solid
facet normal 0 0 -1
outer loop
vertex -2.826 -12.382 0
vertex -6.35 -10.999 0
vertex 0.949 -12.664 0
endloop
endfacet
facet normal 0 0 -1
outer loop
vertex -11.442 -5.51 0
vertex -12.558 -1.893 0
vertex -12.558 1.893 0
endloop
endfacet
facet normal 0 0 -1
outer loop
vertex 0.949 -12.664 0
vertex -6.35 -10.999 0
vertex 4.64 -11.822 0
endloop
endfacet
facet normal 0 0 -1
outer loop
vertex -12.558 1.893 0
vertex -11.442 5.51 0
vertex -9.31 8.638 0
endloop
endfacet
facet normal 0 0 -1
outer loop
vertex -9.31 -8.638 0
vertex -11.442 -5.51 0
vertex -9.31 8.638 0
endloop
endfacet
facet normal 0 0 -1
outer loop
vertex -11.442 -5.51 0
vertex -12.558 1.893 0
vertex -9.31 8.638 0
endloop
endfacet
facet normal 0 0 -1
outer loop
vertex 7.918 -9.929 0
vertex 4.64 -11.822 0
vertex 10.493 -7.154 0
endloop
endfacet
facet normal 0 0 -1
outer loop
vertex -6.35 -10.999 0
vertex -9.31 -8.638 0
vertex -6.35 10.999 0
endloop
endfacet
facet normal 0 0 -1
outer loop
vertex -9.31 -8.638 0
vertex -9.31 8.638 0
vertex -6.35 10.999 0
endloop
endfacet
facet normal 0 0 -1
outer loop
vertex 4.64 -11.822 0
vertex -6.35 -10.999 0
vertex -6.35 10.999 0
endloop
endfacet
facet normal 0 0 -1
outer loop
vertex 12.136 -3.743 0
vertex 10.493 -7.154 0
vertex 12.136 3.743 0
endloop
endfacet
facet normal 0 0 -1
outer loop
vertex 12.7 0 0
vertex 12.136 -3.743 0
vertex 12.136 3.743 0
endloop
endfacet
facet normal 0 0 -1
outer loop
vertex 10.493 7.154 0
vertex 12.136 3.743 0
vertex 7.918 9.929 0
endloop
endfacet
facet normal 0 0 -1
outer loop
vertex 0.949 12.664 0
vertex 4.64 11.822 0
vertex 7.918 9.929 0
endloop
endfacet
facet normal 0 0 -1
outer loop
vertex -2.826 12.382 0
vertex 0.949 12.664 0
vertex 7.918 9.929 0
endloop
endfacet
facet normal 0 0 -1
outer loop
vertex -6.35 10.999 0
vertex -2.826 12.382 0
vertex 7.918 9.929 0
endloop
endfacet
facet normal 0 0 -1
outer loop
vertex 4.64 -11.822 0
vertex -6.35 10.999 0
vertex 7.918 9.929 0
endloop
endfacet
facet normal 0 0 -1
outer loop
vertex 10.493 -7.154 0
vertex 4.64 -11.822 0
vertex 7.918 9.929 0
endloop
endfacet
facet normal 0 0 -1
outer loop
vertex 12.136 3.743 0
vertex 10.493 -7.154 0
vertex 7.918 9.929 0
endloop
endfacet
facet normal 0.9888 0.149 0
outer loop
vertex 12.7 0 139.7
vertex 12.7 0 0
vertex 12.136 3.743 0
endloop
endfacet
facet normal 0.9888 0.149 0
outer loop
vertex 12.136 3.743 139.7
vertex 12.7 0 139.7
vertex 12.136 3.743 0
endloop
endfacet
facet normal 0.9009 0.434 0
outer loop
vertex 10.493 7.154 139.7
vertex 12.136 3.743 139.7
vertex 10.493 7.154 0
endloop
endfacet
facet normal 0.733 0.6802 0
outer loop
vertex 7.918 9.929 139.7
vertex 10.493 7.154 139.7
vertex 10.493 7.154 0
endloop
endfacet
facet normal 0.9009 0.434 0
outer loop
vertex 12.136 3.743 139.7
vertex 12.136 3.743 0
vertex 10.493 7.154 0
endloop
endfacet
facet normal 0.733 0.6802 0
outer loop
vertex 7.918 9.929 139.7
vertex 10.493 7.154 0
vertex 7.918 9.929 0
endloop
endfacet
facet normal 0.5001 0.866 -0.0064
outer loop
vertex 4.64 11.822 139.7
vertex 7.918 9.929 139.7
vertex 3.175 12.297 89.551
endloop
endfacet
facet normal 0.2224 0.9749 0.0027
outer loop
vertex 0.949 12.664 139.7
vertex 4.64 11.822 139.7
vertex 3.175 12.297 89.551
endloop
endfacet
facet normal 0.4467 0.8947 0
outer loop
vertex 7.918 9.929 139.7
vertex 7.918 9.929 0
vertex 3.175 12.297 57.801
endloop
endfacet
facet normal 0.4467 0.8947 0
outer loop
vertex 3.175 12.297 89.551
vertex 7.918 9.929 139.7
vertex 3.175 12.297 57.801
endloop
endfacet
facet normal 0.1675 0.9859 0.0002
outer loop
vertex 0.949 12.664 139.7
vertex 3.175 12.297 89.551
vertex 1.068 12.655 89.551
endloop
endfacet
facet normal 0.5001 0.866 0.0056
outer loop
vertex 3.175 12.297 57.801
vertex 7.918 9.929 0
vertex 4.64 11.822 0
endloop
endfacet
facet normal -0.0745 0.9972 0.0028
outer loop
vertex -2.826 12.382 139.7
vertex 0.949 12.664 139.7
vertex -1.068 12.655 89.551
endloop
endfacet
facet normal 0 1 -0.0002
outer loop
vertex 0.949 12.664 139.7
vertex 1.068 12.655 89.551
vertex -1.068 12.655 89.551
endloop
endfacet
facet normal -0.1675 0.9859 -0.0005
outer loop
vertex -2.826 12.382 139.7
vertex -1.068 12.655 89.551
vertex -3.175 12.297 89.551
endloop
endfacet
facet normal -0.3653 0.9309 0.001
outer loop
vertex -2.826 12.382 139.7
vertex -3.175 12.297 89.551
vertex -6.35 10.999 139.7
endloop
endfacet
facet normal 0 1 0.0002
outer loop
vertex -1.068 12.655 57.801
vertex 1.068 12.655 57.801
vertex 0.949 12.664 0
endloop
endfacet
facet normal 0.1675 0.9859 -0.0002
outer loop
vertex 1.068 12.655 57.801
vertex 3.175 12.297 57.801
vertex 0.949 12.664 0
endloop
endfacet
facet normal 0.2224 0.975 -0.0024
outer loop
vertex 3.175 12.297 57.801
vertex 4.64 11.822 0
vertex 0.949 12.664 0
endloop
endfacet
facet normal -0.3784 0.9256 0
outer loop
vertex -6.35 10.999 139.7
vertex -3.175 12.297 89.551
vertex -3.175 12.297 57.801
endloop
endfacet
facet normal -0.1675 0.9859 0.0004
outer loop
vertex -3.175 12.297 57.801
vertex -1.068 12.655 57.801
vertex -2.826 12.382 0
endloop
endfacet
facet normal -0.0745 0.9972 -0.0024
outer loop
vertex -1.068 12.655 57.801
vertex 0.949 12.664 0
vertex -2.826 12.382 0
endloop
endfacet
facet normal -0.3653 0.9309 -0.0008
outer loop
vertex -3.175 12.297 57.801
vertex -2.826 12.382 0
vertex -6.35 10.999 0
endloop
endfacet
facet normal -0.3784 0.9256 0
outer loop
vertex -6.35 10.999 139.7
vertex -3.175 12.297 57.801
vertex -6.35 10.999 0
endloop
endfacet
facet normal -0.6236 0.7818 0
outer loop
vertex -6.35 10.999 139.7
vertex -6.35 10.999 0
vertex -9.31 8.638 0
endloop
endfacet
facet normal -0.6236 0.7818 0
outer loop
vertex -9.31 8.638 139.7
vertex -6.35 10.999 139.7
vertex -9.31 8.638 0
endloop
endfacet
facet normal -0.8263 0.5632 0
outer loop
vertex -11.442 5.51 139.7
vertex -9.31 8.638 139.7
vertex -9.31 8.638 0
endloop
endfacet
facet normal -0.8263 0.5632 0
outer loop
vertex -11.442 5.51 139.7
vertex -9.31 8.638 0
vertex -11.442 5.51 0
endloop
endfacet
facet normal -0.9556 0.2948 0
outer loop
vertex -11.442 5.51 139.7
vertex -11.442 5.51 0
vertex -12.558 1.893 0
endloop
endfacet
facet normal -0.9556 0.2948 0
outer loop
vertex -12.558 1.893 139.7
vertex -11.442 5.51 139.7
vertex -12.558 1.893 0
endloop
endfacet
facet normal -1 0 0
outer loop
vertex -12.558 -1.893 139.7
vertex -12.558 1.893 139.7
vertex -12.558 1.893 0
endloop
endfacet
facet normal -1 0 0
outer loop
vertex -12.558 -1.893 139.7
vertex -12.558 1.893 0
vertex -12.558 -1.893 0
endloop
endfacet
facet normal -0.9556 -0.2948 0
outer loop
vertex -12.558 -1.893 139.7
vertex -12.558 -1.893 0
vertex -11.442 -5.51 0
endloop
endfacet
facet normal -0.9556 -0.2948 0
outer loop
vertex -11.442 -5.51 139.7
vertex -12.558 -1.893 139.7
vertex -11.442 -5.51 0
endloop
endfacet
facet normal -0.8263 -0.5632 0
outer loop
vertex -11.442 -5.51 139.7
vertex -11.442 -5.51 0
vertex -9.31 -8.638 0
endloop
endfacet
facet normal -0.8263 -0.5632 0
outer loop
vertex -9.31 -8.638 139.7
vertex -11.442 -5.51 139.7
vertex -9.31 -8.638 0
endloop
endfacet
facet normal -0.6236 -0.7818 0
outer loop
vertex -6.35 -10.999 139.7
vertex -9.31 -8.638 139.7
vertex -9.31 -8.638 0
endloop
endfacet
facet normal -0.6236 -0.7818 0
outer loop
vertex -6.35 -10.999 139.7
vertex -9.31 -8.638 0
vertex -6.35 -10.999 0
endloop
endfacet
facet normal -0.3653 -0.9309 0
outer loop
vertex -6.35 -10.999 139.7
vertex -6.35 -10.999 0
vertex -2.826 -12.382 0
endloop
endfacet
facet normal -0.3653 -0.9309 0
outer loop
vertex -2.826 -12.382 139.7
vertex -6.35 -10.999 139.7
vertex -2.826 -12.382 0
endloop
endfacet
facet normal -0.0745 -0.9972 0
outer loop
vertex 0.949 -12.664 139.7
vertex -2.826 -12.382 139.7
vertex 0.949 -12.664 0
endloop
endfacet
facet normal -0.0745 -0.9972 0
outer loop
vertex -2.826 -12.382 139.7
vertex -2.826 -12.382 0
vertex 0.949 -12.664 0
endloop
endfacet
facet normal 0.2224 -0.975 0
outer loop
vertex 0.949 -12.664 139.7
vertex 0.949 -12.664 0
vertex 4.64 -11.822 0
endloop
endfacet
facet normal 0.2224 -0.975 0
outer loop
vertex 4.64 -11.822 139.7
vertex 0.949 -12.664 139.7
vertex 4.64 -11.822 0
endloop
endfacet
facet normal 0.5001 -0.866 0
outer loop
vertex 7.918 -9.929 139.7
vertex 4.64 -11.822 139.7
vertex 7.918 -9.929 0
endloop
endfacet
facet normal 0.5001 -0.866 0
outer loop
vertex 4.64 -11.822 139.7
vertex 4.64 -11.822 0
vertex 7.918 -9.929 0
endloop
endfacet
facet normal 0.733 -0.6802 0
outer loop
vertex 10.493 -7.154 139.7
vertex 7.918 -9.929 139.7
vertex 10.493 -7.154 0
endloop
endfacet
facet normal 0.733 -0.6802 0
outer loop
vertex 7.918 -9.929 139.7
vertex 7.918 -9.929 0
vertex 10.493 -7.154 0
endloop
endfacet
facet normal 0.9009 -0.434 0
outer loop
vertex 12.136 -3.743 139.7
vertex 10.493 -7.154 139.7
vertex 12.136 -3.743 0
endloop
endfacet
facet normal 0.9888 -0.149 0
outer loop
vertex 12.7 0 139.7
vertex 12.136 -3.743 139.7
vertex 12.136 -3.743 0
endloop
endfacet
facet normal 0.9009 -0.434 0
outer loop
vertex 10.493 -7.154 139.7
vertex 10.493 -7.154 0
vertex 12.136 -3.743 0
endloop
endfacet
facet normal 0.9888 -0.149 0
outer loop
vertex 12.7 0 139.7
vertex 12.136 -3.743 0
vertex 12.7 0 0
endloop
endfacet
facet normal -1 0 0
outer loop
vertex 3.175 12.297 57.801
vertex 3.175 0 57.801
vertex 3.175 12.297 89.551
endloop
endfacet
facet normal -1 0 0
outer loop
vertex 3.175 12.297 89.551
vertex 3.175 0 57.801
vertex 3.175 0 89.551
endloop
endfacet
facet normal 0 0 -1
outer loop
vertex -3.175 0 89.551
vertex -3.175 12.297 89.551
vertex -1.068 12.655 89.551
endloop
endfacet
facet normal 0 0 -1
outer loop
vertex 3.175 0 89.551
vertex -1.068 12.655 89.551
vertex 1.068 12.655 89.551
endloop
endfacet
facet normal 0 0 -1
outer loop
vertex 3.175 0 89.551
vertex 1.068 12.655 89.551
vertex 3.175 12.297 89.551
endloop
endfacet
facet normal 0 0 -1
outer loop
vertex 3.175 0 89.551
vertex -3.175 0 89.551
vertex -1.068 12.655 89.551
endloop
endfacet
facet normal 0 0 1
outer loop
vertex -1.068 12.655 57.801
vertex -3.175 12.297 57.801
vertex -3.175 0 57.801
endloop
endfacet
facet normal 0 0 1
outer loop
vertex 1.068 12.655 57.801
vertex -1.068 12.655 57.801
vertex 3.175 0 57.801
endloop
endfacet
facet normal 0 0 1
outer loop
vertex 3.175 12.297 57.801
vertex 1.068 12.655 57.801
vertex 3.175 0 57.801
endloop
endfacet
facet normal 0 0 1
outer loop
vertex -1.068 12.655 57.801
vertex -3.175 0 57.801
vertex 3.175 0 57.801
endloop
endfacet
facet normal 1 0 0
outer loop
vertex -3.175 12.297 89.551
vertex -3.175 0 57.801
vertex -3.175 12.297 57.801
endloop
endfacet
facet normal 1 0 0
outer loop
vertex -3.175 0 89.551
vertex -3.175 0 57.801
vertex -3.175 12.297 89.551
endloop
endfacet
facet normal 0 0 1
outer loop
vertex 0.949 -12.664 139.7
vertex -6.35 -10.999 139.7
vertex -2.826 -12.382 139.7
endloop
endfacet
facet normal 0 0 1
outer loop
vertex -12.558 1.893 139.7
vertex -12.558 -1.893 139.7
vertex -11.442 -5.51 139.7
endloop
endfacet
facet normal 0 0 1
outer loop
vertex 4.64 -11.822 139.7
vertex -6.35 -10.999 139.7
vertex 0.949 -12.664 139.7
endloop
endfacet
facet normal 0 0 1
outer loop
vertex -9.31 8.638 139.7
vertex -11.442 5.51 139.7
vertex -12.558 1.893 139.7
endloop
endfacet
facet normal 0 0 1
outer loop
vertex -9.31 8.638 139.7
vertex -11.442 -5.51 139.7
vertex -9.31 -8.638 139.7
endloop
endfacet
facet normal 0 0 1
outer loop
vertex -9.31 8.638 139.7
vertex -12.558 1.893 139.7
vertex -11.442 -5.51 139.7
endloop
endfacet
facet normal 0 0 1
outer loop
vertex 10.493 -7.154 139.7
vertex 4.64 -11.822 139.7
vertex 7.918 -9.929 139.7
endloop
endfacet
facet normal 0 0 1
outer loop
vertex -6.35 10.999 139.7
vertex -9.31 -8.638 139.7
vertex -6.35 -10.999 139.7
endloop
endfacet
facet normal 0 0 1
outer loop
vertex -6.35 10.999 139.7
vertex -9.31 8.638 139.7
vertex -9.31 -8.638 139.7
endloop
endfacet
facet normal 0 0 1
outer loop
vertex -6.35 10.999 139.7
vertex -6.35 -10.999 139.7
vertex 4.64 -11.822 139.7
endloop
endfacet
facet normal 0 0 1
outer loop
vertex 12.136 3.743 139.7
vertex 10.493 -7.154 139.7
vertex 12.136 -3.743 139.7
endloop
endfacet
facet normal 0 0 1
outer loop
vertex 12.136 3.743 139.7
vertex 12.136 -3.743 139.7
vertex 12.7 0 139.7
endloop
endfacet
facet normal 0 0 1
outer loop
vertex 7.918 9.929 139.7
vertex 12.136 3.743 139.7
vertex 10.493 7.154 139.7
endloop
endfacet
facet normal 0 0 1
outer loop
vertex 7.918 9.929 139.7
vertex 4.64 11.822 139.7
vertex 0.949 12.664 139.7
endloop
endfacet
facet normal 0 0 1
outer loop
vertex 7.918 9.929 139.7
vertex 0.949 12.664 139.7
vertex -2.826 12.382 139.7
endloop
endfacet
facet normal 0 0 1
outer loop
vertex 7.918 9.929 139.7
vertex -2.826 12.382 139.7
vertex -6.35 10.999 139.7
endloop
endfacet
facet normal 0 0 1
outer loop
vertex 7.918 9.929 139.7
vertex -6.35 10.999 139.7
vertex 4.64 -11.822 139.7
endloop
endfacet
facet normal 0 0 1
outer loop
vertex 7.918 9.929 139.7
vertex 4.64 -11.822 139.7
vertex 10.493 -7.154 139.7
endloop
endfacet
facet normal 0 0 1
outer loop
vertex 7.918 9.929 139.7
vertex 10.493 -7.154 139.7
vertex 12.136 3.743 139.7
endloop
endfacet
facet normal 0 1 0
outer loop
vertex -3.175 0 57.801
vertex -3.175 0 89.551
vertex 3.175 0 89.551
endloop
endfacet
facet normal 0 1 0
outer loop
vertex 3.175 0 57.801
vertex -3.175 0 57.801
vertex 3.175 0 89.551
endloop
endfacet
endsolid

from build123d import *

# Parameters (mm, degrees)
F0_R     = 12.7
F1_DEPTH = 139.7
F2_W     = 6.35
F2_H     = 31.75
F3_DEPTH = 30.734


with BuildPart() as f1:
    # F0 (on Top) → F1 (new body)
    with BuildSketch(Plane.XY):
        Circle(F0_R)
    extrude(amount=F1_DEPTH)

    # F2 (on Front) → F3 (cut)
    with BuildSketch(Plane.XZ):
        with Locations((0, 73.676325)):
            Rectangle(F2_W, F2_H)
    extrude(amount=-F3_DEPTH, mode=Mode.SUBTRACT)


solid = f1.part
